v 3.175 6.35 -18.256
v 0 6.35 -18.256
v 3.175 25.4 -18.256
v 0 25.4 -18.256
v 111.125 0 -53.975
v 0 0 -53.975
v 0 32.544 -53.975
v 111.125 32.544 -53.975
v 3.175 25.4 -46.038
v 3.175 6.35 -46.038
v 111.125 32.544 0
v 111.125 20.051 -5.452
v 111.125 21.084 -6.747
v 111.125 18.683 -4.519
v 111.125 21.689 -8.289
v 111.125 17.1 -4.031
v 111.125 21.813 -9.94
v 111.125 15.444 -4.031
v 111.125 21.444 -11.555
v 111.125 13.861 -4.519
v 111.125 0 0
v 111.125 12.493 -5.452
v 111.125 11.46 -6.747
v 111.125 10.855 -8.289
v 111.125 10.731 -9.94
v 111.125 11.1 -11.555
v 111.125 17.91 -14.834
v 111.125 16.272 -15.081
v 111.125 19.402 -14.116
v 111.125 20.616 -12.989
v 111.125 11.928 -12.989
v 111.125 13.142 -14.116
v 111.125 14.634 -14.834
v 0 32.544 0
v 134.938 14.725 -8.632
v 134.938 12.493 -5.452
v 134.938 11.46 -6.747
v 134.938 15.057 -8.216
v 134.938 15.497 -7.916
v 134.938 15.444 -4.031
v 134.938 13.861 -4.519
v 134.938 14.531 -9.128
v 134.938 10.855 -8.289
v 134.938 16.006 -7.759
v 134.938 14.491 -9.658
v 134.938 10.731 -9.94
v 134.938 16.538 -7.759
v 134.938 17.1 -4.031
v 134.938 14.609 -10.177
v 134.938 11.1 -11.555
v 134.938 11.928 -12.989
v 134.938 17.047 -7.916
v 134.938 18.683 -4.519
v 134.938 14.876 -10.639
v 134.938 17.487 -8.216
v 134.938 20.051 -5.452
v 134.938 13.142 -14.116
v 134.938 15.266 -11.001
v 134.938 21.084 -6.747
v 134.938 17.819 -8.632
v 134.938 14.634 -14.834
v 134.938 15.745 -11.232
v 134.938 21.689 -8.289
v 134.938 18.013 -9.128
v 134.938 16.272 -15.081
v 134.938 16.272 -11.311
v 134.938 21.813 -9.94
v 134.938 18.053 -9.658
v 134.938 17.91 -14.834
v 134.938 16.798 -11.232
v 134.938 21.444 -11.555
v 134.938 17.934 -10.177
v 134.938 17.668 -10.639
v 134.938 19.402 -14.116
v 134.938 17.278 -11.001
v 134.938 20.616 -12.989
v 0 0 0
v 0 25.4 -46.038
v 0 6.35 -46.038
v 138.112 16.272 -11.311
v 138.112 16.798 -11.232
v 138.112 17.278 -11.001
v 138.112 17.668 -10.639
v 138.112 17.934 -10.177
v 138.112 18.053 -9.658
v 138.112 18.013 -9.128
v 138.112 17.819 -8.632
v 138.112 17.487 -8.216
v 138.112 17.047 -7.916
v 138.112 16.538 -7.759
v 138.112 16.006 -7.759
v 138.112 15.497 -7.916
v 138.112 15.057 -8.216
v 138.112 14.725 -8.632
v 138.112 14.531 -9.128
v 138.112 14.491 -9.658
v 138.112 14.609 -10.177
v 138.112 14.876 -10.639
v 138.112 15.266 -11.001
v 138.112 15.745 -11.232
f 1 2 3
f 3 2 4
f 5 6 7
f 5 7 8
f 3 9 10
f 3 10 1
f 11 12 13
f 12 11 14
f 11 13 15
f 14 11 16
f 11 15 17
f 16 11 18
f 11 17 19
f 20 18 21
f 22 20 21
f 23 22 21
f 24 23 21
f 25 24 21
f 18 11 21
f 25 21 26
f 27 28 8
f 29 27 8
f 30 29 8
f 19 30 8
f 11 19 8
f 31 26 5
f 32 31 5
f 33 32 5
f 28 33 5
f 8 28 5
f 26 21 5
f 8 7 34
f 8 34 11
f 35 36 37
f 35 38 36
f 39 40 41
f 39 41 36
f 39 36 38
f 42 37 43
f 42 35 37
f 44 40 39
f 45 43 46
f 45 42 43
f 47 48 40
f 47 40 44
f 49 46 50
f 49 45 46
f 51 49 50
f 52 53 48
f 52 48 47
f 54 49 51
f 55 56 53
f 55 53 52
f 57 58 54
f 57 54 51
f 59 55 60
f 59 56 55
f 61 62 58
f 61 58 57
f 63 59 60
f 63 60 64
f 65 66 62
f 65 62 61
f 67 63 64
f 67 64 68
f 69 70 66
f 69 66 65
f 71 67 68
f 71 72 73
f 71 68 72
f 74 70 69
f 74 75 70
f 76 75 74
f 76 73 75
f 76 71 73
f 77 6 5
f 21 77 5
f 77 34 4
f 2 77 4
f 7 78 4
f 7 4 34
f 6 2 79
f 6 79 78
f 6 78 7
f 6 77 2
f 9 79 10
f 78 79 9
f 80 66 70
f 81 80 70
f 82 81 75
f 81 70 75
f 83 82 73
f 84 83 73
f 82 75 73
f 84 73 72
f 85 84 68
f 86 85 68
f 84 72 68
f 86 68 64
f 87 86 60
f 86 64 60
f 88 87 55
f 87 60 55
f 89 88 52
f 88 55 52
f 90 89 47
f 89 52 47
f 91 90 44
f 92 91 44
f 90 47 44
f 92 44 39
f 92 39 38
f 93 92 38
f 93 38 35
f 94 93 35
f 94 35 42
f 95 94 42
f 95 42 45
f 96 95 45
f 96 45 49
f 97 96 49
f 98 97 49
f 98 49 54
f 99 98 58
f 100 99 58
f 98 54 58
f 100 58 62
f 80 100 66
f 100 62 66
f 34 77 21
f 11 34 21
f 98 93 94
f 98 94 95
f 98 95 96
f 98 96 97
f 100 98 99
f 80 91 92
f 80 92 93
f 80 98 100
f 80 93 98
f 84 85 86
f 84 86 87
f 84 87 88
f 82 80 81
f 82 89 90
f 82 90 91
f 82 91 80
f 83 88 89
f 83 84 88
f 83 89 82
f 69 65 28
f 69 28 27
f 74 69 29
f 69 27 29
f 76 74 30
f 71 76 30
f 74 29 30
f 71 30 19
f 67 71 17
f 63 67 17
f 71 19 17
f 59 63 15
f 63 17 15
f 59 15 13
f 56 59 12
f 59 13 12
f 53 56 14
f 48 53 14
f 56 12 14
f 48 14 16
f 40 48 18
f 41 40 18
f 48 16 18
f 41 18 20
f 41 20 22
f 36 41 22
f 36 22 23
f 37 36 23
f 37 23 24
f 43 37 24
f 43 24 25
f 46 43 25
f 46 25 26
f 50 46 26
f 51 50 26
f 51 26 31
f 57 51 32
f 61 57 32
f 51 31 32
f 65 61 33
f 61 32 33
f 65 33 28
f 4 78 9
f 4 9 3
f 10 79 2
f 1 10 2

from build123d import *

# Parameters (mm, degrees)
SKETCH1_W           = 111.125
SKETCH1_H           = 53.975
BOSS_EXTRUDE1_DEPTH = 32.54375
SKETCH2_W           = 27.78125
SKETCH2_H           = 19.05
CUT_EXTRUDE1_DEPTH  = 3.175
SKETCH4_R           = 5.55625
BOSS_EXTRUDE2_DEPTH = 23.8125
SKETCH5_R           = 1.7859375
BOSS_EXTRUDE3_DEPTH = 3.175


with BuildPart() as part:
    # Sketch1 → Boss-Extrude1 (new body)
    with BuildSketch(Plane(origin=(0, 0, 0), x_dir=(1, 0, 0), z_dir=(0, 1, 0))):
        with Locations((55.5625, 26.9875)):
            Rectangle(SKETCH1_W, SKETCH1_H)
    extrude(amount=BOSS_EXTRUDE1_DEPTH)

    # Sketch2 → Cut-Extrude1 (cut)
    with BuildSketch(Plane.ZY):
        with Locations((-32.146875, 15.875)):
            Rectangle(SKETCH2_W, SKETCH2_H)
    extrude(amount=-CUT_EXTRUDE1_DEPTH, mode=Mode.SUBTRACT)

    # Sketch4 → Boss-Extrude2 (add)
    with BuildSketch(Plane(origin=(111.125, 0, 0), x_dir=(0, 0, -1), z_dir=(1, 0, 0))):
        with Locations((9.525, 16.271875)):
            Circle(SKETCH4_R)
    extrude(amount=BOSS_EXTRUDE2_DEPTH)

    # Sketch5 → Boss-Extrude3 (add)
    with BuildSketch(Plane(origin=(134.9375, 0, 0), x_dir=(0, 0, -1), z_dir=(1, 0, 0))):
        with Locations((9.525, 16.271875)):
            Circle(SKETCH5_R)
    extrude(amount=BOSS_EXTRUDE3_DEPTH)


solid = part.part
